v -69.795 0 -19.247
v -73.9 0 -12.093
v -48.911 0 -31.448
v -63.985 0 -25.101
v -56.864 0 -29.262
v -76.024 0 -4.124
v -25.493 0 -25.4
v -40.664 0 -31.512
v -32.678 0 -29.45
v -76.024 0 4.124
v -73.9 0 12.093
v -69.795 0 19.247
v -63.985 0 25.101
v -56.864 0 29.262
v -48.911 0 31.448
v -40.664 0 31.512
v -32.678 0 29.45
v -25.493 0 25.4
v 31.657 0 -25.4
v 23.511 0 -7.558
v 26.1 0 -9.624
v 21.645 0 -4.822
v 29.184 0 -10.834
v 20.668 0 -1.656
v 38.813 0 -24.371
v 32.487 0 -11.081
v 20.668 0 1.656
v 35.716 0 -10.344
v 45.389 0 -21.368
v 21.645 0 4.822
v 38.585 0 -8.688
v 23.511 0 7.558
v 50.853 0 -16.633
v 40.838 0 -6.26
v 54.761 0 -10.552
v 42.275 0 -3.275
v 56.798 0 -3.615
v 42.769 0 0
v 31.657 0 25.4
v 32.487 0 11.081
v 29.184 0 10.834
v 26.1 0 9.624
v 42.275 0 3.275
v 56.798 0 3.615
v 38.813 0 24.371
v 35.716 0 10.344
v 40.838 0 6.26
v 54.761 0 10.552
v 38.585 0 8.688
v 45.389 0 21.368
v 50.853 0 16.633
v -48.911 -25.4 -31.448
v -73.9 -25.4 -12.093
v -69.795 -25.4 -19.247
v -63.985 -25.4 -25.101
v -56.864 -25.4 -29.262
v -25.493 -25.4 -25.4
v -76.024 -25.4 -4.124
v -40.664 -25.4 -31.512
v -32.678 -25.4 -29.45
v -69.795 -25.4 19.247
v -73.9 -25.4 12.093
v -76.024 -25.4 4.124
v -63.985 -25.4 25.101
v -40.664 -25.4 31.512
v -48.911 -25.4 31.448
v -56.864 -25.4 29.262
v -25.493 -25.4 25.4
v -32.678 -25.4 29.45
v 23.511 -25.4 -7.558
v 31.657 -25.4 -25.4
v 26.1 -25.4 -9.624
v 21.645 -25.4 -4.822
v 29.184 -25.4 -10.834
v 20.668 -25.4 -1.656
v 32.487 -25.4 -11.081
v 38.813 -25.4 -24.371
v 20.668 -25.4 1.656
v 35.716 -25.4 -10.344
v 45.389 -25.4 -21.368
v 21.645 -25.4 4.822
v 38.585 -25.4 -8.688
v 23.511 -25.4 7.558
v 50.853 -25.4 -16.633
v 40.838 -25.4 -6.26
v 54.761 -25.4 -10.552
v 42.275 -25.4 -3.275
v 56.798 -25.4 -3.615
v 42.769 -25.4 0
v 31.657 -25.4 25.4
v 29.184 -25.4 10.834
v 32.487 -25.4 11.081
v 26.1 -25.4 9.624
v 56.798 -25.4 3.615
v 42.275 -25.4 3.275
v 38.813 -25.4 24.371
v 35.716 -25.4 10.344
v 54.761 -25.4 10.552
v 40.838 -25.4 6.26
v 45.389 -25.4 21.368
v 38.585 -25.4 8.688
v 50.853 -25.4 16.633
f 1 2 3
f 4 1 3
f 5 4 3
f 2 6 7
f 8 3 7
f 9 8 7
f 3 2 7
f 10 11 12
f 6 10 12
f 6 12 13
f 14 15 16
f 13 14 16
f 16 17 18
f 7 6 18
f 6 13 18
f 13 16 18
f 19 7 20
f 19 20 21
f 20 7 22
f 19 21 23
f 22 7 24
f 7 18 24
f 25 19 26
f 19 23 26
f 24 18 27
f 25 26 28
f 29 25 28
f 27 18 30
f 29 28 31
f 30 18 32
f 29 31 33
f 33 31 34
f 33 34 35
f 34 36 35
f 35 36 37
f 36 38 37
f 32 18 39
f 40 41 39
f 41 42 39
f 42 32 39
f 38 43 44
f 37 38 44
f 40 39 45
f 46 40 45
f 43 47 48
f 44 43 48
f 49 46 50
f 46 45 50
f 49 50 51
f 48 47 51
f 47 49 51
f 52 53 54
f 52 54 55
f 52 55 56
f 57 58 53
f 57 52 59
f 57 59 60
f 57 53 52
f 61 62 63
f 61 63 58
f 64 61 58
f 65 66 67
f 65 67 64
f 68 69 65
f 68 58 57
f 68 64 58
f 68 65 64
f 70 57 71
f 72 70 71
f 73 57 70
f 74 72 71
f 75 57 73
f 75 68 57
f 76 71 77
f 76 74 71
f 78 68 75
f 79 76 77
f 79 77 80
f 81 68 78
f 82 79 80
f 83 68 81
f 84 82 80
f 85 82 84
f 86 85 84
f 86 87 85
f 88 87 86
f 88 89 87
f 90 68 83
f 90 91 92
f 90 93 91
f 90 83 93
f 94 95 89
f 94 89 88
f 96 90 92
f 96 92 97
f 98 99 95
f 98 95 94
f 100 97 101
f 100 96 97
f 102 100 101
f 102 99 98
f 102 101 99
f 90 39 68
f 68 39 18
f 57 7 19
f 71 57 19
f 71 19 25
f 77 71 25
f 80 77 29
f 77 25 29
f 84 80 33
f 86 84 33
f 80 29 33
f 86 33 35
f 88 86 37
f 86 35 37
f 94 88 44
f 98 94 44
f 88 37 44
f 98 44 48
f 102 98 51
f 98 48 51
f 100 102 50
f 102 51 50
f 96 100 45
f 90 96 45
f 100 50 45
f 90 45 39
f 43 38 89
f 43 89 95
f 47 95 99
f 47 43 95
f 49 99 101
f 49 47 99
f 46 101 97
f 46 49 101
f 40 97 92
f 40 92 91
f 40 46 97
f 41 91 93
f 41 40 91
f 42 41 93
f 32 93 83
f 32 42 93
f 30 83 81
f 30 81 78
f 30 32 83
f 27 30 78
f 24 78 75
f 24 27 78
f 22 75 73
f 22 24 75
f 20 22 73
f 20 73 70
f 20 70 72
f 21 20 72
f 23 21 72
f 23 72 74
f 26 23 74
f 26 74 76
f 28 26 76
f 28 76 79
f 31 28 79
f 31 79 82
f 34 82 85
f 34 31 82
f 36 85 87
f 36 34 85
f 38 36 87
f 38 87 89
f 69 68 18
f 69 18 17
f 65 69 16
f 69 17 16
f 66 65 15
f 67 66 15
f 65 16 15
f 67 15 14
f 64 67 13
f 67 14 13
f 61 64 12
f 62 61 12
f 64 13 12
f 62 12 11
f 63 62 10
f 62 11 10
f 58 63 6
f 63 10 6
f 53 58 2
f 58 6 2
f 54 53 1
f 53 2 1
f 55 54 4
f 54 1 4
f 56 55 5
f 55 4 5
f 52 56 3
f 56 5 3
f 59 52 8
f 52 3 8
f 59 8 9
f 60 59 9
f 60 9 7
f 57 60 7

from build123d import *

# Parameters (mm, degrees)
F0_R     = 11.1125
F1_DEPTH = 25.4


with BuildPart() as f1:
    # F0 (on Front) → F1 (new body)
    with BuildSketch(Plane.XZ):
        with BuildLine():
            ThreePointArc((-25.493373, -25.4), (-16.145309, -14.199032), (-12.793373, 0))
            ThreePointArc((-12.793373, 0), (-16.145309, 14.199032), (-25.493373, 25.4))
            ThreePointArc((-25.493373, 25.4), (-76.293373, 0), (-25.493373, -25.4))
        make_face()
        with BuildLine():
            ThreePointArc((-25.493373, 25.4), (-16.145309, 14.199032), (-12.793373, 0))
            ThreePointArc((-12.793373, 0), (-16.145309, -14.199032), (-25.493373, -25.4))
            Line((-25.493373, -25.4), (31.656627, -25.4))
            ThreePointArc((31.656627, -25.4), (57.056627, 0), (31.656627, 25.4))
            Line((31.656627, 25.4), (-25.493373, 25.4))
        make_face()
        with Locations((31.656627, 0)):
            Circle(F0_R, mode=Mode.SUBTRACT)
    extrude(amount=F1_DEPTH)


solid = f1.part
